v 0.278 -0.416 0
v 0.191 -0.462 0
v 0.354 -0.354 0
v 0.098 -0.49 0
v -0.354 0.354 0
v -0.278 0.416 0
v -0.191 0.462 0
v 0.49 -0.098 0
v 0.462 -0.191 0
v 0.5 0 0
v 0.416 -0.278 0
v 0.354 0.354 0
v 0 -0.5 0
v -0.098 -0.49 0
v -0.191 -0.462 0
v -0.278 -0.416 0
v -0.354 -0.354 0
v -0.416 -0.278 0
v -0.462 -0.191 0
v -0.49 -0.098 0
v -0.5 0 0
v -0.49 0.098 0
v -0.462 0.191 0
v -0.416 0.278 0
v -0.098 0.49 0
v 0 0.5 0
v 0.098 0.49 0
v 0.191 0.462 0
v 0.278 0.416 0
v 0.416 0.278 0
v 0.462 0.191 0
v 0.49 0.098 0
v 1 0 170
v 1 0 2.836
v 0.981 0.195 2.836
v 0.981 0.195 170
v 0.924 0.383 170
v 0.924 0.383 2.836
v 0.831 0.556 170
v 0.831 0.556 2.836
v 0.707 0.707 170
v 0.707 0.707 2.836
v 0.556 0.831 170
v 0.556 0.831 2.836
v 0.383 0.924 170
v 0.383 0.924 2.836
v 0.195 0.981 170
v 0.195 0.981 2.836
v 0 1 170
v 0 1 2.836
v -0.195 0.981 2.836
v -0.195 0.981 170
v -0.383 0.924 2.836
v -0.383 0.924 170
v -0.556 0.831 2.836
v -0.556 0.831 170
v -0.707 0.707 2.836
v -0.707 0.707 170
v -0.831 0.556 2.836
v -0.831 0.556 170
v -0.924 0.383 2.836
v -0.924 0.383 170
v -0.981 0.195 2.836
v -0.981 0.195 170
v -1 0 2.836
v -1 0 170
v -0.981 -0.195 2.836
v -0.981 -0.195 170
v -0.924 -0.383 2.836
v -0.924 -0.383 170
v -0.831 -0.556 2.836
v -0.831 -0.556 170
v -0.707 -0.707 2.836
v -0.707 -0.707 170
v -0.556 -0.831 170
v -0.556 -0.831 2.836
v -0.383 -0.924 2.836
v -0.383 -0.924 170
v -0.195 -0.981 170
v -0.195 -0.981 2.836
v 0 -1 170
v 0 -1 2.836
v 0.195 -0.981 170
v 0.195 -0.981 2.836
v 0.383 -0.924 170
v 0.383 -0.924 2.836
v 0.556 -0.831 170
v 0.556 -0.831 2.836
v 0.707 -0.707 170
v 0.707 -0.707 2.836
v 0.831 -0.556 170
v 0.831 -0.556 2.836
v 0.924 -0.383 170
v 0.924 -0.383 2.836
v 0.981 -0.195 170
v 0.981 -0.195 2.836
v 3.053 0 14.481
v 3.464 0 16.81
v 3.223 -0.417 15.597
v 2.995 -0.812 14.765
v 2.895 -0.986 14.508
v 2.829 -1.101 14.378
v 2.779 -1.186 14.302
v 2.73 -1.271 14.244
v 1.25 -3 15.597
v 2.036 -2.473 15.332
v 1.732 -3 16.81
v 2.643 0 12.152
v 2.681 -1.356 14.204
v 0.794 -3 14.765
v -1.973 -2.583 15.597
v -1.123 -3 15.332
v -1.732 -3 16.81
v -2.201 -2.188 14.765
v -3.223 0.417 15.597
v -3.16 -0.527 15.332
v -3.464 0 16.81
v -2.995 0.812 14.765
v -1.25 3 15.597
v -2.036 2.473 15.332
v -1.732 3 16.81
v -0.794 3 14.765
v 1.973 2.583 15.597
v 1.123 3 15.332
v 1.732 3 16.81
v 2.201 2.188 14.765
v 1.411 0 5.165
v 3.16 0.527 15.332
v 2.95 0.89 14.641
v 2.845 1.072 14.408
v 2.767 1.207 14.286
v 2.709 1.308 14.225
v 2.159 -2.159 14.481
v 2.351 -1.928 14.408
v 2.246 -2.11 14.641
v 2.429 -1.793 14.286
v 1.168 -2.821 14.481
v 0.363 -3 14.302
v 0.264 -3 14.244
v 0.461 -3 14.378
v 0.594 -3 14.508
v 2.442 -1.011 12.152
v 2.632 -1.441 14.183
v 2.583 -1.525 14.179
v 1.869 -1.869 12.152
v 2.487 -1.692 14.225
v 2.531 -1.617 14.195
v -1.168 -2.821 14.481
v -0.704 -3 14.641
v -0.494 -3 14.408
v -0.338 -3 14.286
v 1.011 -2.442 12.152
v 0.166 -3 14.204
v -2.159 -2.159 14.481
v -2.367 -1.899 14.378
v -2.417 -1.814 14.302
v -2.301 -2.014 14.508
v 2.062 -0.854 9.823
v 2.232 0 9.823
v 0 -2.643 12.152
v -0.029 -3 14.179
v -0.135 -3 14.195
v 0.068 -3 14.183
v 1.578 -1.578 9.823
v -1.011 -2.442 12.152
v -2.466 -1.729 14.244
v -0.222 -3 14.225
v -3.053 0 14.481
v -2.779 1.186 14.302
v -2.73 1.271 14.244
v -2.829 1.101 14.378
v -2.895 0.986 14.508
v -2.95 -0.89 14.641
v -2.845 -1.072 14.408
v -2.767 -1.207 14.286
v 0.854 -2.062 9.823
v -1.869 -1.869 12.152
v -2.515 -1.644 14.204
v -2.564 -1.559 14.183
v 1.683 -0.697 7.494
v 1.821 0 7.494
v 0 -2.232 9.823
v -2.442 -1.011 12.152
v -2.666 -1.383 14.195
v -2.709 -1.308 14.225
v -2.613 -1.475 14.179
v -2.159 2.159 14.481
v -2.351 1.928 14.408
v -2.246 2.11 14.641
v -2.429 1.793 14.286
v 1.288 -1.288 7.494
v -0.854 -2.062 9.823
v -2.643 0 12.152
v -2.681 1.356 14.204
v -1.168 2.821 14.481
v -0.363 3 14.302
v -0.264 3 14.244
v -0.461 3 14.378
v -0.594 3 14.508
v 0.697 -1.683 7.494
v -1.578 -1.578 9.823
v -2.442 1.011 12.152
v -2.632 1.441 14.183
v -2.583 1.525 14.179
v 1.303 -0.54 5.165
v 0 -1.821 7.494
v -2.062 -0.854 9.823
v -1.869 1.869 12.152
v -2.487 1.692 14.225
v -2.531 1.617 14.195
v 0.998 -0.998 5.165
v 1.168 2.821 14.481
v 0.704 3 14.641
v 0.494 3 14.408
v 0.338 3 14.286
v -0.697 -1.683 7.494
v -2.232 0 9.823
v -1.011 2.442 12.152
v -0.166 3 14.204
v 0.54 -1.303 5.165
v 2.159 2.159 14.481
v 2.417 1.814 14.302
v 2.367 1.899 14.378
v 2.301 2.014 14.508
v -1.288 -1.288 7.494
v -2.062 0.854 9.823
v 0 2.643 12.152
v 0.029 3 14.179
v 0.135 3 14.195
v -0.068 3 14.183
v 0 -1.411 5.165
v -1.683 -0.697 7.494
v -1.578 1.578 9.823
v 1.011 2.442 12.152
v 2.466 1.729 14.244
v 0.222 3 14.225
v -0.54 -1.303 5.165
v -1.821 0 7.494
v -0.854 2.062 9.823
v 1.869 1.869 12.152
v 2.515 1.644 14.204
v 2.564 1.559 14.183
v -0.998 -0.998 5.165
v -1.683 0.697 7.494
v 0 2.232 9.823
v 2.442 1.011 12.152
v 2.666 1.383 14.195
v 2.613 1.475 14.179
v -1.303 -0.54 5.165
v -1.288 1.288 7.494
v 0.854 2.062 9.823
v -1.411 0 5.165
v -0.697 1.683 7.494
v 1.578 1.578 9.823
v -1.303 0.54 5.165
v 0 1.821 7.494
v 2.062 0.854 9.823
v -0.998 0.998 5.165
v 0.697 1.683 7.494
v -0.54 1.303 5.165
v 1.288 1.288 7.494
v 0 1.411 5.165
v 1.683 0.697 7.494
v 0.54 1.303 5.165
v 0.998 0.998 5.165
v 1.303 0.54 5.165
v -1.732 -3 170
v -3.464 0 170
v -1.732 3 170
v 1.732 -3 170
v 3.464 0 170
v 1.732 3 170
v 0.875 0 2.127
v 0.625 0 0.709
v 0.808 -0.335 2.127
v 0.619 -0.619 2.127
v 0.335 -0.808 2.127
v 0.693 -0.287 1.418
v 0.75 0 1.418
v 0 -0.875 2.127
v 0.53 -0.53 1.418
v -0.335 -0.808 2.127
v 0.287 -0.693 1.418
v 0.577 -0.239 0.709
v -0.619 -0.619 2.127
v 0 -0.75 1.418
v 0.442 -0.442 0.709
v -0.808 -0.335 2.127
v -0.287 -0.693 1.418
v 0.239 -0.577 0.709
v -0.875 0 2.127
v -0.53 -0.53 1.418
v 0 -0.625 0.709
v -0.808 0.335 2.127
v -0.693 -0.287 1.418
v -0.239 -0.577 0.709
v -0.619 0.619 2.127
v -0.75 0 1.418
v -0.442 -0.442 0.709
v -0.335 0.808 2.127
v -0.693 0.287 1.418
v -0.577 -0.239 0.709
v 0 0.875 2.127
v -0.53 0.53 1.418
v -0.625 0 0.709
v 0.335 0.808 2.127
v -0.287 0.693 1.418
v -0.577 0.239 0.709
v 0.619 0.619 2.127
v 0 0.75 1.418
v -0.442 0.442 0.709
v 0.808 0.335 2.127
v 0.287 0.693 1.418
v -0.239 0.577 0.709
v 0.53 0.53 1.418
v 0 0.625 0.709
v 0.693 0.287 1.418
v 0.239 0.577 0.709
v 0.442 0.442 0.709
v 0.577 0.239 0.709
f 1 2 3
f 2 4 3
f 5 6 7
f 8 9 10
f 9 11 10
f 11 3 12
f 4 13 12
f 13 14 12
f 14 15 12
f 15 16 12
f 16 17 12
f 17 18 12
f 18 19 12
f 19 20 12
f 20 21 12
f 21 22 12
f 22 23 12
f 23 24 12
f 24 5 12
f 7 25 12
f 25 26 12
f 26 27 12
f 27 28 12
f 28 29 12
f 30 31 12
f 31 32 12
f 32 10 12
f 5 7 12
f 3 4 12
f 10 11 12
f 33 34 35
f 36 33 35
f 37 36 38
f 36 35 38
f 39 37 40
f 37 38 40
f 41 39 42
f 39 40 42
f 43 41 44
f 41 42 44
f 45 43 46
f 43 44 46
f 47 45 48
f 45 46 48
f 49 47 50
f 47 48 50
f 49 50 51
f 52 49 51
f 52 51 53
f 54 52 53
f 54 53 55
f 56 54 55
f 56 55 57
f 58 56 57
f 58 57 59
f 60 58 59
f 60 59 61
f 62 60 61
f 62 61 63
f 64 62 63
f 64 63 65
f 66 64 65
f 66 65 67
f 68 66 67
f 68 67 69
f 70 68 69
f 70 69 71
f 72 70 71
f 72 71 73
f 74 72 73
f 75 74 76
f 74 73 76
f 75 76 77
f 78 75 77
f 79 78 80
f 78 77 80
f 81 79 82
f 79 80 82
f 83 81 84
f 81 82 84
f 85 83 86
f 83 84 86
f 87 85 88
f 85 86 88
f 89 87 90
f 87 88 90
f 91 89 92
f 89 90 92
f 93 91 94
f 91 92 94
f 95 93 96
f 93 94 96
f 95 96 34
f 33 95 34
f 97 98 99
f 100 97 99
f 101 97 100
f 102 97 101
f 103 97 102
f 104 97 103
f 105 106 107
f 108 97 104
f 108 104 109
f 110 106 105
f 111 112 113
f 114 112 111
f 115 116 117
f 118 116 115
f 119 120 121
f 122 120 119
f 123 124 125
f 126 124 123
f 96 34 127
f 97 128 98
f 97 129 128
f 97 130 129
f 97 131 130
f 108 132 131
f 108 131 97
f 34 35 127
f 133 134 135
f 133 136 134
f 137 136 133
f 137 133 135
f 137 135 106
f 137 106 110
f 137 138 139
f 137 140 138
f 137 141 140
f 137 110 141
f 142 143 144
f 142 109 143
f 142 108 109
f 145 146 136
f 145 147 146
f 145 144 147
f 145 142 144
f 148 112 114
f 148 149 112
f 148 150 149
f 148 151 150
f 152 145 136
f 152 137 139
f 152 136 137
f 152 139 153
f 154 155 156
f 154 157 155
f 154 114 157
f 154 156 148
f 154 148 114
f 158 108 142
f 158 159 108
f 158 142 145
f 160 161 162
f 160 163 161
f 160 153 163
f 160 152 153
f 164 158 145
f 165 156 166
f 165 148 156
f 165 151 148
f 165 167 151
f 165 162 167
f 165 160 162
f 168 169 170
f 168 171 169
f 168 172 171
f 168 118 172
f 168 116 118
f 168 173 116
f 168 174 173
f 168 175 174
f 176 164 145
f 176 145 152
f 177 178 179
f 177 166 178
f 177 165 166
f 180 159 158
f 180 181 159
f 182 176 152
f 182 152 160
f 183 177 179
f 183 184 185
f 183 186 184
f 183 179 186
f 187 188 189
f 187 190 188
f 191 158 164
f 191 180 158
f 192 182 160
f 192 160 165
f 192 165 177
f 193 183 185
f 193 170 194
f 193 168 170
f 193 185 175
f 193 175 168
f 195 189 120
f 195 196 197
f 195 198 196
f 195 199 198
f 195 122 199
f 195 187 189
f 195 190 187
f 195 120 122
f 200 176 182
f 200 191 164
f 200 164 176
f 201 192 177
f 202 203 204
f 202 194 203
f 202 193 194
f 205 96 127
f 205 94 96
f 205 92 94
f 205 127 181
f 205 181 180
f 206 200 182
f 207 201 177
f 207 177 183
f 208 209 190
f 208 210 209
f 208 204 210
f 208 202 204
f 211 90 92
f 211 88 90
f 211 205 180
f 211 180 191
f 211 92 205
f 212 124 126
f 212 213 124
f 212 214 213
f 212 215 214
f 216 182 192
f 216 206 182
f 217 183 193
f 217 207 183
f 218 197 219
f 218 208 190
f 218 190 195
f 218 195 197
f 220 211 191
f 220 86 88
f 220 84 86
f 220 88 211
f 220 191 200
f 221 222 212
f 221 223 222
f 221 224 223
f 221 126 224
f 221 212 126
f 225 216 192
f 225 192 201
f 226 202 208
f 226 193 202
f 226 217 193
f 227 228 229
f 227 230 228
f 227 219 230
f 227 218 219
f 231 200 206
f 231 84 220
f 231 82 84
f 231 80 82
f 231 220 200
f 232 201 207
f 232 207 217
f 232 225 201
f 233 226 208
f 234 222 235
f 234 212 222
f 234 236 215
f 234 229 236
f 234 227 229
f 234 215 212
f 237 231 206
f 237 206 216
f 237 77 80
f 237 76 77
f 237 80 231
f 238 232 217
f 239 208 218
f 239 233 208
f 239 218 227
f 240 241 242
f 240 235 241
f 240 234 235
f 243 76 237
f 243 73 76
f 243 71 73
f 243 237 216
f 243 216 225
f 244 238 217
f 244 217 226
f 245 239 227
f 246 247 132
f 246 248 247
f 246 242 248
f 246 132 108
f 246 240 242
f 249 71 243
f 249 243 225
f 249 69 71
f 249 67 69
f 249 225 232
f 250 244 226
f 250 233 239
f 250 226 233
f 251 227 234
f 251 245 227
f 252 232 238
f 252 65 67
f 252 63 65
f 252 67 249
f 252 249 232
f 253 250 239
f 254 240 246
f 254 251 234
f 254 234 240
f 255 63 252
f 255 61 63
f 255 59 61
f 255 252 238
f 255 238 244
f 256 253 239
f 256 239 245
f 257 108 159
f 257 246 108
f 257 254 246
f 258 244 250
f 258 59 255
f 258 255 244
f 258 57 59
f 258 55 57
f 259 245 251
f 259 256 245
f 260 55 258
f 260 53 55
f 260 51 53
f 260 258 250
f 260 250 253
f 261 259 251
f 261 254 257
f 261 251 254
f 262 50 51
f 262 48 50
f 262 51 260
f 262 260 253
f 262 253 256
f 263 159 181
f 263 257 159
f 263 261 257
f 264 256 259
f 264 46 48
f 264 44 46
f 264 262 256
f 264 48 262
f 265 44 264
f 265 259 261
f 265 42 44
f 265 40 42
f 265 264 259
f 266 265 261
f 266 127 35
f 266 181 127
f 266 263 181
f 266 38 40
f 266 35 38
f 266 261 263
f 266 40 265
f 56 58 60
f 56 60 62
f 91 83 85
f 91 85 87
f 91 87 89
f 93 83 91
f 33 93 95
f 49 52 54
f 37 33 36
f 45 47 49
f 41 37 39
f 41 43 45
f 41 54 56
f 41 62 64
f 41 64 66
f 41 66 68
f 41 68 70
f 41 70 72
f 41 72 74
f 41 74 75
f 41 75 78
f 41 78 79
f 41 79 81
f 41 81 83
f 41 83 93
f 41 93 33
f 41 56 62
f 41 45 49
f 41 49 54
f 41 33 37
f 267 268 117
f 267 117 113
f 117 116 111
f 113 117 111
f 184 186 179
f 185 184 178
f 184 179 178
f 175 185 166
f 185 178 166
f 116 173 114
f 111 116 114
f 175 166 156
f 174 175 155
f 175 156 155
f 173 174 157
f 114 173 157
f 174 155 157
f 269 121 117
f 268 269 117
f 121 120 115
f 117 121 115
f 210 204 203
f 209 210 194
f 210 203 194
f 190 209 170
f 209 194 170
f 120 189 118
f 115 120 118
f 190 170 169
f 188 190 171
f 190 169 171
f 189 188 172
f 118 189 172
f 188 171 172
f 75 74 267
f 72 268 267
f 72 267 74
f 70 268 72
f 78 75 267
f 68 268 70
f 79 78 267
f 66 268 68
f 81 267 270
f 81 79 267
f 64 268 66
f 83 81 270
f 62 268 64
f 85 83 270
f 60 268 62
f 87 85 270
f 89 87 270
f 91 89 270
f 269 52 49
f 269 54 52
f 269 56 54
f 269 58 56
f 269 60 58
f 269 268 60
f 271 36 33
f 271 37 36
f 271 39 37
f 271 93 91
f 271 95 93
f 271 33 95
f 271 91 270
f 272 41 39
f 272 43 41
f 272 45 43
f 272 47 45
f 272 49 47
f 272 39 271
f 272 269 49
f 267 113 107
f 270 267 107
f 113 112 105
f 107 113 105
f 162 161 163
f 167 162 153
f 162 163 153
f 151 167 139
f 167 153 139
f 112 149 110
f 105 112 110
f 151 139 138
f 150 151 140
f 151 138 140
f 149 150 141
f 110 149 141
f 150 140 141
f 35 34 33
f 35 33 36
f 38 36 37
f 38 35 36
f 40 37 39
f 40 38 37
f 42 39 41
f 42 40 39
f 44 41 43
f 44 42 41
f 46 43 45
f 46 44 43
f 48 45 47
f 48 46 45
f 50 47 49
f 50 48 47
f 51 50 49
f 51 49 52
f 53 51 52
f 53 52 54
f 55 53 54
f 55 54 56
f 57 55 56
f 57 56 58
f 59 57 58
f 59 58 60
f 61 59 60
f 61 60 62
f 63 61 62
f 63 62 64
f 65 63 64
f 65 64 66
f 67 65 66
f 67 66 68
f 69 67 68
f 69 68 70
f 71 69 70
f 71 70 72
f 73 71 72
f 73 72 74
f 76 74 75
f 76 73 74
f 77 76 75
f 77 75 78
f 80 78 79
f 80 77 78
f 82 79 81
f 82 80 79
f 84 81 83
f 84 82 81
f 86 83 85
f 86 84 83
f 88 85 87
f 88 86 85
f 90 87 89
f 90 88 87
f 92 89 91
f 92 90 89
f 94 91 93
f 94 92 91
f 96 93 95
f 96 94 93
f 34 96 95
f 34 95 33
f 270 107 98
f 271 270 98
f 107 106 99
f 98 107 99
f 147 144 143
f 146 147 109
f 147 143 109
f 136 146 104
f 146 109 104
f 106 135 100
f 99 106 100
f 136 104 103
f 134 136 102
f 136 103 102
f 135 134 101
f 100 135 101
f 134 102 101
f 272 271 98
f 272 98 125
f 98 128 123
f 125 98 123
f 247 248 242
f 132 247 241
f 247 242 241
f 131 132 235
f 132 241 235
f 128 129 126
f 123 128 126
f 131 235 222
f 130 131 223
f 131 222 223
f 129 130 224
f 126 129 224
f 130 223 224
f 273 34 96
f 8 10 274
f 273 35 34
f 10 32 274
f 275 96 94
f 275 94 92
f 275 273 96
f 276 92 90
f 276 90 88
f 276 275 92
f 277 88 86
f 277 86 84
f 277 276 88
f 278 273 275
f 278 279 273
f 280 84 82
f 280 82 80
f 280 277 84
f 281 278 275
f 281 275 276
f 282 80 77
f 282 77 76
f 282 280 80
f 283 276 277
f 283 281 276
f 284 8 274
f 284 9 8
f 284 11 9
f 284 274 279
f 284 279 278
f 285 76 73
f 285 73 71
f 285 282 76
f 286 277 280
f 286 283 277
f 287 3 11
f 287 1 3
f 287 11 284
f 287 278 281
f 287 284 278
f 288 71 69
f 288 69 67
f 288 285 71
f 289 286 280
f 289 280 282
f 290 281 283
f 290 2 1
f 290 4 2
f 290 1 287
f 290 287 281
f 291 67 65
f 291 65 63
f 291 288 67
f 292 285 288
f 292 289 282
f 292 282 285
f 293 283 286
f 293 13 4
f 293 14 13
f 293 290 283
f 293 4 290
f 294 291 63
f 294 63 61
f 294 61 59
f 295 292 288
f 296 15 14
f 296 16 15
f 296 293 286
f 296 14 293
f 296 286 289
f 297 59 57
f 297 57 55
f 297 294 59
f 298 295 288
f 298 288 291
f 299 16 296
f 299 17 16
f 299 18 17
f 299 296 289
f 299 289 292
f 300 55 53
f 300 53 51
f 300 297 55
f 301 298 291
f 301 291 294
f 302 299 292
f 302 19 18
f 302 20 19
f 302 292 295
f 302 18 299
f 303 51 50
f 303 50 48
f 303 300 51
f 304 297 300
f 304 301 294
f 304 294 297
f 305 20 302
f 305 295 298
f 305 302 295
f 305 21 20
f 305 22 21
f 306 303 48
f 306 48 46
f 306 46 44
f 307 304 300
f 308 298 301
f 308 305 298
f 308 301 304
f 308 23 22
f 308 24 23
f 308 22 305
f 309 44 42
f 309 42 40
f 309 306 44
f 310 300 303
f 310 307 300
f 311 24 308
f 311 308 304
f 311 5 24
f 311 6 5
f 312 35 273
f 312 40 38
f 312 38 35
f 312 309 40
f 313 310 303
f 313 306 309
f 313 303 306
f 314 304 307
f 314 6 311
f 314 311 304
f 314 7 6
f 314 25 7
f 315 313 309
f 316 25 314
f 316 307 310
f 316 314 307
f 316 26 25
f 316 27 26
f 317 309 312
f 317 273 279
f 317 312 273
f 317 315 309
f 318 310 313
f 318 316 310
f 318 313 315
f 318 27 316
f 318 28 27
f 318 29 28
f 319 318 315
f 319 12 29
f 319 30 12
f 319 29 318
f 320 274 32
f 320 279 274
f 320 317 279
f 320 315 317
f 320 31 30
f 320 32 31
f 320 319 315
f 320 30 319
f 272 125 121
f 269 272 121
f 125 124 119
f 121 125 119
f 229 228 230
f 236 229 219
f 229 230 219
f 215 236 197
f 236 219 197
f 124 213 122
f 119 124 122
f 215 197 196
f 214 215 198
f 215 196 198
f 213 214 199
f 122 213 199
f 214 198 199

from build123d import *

# Parameters (mm, degrees)
F0_R     = 1
F1_DEPTH = 170
F2_DEPTH = 170


with BuildPart() as f1:
    # F0 (on Top) → F1 (new body)
    with BuildSketch(Plane.XY):
        Polygon((1.732051, 3), (-1.732051, 3), (-3.464102, 0), (-1.732051, -3), (1.732051, -3), (3.464102, 0), align=None)
        Circle(F0_R, mode=Mode.SUBTRACT)
    extrude(amount=F1_DEPTH)


with BuildPart() as f2:
    # F0 (on Top) → F2 (new body)
    with BuildSketch(Plane.XY):
        Circle(F0_R)
    extrude(amount=F2_DEPTH)


with BuildPart() as f4_tool:
    # F3 (on Front) → F4 (revolve)
    with BuildSketch(Plane.XZ):
        Polygon((4.082964, 20.32), (0.5, 0), (4.082964, 0), align=None)
    revolve(axis=Axis((0, 0, -2.013294), (0, 0, -1)))


with BuildPart() as f1_1:
    add(f1.part)

    # F4: cut by f4_tool
    add(f4_tool.part, mode=Mode.SUBTRACT)


with BuildPart() as f2_1:
    add(f2.part)

    # F4: cut by f4_tool
    add(f4_tool.part, mode=Mode.SUBTRACT)


solid = Compound([f1_1.part, f2_1.part])
